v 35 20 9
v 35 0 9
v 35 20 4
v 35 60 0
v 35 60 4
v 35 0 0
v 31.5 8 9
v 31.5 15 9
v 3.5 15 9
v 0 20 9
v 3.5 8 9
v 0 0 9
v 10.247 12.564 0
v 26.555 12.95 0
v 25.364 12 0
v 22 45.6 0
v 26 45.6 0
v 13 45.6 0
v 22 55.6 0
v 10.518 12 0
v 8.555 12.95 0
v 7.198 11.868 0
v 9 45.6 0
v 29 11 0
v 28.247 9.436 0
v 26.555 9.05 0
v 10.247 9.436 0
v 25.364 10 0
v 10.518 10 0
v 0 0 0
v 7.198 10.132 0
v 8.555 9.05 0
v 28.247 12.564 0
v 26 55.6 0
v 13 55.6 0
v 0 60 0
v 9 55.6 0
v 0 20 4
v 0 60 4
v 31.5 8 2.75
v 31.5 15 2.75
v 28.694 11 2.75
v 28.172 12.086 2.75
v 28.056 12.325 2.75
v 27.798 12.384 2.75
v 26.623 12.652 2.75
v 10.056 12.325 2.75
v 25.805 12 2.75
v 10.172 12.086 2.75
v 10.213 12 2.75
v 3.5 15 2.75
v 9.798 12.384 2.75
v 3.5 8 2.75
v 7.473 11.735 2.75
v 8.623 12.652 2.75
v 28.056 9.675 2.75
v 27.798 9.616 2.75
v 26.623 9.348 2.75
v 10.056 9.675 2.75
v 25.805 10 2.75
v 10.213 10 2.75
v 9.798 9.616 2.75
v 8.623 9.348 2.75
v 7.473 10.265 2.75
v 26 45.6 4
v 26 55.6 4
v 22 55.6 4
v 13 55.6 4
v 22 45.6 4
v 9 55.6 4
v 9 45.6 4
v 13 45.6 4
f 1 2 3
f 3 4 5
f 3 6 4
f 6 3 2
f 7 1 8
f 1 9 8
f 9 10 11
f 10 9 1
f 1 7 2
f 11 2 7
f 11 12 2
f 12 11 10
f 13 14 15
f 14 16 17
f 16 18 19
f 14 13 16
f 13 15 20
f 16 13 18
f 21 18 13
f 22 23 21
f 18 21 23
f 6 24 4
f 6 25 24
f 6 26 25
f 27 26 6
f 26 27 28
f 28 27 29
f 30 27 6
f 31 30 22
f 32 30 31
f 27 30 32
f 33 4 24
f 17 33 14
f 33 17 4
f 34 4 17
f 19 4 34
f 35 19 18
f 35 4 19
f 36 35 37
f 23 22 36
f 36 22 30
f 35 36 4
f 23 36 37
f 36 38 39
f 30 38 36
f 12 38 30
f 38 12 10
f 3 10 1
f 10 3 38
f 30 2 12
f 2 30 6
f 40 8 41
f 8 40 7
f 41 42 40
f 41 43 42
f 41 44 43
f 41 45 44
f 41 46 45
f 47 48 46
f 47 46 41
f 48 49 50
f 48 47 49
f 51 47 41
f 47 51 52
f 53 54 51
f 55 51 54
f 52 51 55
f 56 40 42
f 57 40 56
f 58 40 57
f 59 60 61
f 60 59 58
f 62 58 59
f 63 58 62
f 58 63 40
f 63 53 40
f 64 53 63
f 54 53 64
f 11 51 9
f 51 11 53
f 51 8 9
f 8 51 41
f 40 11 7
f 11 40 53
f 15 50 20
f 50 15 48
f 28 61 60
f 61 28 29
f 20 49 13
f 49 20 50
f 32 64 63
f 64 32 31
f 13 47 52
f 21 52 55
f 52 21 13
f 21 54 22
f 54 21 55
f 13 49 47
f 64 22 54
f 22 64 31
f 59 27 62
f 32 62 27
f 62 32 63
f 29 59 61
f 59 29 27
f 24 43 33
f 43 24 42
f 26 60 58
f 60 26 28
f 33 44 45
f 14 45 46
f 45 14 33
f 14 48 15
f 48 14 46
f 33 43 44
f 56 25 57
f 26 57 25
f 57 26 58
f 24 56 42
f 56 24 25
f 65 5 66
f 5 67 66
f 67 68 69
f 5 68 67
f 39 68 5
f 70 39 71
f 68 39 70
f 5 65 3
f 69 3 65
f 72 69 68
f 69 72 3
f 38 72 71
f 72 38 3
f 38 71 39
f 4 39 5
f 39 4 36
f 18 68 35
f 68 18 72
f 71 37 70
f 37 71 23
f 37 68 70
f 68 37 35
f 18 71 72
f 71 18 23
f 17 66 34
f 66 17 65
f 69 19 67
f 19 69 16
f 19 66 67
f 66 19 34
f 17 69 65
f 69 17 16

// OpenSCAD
difference() {
    cube([35,20,9]);
    translate([3.5,8,2.75]) cube([28,7,9]);
    translate([8,10,0]) cube([20,2,2.75]);
    
    translate([9,11,0]) cylinder(9,2);
    translate([27,11,0]) cylinder(9,2);
}

translate([0,20, 0]) 
difference() {
    cube([35,40,4]);
    translate([9,25.6,0]) cube([4,10,9]);
    translate([22,25.6,0]) cube([4,10,9]);
}


/*

translate([5,45,0]) cube([4,10,9]);
translate([26,45,0]) cube([4,10,9]);

translate([4.0,9.9,0]) difference() {
    cube([7,3.2,3]);
    translate([4,1.6,0]) cylinder(3,1);
}

translate([24,9.9,0]) difference() {
    cube([7,3.2,3]);
    translate([3,1.6,0]) cylinder(3,1);
}
*/
